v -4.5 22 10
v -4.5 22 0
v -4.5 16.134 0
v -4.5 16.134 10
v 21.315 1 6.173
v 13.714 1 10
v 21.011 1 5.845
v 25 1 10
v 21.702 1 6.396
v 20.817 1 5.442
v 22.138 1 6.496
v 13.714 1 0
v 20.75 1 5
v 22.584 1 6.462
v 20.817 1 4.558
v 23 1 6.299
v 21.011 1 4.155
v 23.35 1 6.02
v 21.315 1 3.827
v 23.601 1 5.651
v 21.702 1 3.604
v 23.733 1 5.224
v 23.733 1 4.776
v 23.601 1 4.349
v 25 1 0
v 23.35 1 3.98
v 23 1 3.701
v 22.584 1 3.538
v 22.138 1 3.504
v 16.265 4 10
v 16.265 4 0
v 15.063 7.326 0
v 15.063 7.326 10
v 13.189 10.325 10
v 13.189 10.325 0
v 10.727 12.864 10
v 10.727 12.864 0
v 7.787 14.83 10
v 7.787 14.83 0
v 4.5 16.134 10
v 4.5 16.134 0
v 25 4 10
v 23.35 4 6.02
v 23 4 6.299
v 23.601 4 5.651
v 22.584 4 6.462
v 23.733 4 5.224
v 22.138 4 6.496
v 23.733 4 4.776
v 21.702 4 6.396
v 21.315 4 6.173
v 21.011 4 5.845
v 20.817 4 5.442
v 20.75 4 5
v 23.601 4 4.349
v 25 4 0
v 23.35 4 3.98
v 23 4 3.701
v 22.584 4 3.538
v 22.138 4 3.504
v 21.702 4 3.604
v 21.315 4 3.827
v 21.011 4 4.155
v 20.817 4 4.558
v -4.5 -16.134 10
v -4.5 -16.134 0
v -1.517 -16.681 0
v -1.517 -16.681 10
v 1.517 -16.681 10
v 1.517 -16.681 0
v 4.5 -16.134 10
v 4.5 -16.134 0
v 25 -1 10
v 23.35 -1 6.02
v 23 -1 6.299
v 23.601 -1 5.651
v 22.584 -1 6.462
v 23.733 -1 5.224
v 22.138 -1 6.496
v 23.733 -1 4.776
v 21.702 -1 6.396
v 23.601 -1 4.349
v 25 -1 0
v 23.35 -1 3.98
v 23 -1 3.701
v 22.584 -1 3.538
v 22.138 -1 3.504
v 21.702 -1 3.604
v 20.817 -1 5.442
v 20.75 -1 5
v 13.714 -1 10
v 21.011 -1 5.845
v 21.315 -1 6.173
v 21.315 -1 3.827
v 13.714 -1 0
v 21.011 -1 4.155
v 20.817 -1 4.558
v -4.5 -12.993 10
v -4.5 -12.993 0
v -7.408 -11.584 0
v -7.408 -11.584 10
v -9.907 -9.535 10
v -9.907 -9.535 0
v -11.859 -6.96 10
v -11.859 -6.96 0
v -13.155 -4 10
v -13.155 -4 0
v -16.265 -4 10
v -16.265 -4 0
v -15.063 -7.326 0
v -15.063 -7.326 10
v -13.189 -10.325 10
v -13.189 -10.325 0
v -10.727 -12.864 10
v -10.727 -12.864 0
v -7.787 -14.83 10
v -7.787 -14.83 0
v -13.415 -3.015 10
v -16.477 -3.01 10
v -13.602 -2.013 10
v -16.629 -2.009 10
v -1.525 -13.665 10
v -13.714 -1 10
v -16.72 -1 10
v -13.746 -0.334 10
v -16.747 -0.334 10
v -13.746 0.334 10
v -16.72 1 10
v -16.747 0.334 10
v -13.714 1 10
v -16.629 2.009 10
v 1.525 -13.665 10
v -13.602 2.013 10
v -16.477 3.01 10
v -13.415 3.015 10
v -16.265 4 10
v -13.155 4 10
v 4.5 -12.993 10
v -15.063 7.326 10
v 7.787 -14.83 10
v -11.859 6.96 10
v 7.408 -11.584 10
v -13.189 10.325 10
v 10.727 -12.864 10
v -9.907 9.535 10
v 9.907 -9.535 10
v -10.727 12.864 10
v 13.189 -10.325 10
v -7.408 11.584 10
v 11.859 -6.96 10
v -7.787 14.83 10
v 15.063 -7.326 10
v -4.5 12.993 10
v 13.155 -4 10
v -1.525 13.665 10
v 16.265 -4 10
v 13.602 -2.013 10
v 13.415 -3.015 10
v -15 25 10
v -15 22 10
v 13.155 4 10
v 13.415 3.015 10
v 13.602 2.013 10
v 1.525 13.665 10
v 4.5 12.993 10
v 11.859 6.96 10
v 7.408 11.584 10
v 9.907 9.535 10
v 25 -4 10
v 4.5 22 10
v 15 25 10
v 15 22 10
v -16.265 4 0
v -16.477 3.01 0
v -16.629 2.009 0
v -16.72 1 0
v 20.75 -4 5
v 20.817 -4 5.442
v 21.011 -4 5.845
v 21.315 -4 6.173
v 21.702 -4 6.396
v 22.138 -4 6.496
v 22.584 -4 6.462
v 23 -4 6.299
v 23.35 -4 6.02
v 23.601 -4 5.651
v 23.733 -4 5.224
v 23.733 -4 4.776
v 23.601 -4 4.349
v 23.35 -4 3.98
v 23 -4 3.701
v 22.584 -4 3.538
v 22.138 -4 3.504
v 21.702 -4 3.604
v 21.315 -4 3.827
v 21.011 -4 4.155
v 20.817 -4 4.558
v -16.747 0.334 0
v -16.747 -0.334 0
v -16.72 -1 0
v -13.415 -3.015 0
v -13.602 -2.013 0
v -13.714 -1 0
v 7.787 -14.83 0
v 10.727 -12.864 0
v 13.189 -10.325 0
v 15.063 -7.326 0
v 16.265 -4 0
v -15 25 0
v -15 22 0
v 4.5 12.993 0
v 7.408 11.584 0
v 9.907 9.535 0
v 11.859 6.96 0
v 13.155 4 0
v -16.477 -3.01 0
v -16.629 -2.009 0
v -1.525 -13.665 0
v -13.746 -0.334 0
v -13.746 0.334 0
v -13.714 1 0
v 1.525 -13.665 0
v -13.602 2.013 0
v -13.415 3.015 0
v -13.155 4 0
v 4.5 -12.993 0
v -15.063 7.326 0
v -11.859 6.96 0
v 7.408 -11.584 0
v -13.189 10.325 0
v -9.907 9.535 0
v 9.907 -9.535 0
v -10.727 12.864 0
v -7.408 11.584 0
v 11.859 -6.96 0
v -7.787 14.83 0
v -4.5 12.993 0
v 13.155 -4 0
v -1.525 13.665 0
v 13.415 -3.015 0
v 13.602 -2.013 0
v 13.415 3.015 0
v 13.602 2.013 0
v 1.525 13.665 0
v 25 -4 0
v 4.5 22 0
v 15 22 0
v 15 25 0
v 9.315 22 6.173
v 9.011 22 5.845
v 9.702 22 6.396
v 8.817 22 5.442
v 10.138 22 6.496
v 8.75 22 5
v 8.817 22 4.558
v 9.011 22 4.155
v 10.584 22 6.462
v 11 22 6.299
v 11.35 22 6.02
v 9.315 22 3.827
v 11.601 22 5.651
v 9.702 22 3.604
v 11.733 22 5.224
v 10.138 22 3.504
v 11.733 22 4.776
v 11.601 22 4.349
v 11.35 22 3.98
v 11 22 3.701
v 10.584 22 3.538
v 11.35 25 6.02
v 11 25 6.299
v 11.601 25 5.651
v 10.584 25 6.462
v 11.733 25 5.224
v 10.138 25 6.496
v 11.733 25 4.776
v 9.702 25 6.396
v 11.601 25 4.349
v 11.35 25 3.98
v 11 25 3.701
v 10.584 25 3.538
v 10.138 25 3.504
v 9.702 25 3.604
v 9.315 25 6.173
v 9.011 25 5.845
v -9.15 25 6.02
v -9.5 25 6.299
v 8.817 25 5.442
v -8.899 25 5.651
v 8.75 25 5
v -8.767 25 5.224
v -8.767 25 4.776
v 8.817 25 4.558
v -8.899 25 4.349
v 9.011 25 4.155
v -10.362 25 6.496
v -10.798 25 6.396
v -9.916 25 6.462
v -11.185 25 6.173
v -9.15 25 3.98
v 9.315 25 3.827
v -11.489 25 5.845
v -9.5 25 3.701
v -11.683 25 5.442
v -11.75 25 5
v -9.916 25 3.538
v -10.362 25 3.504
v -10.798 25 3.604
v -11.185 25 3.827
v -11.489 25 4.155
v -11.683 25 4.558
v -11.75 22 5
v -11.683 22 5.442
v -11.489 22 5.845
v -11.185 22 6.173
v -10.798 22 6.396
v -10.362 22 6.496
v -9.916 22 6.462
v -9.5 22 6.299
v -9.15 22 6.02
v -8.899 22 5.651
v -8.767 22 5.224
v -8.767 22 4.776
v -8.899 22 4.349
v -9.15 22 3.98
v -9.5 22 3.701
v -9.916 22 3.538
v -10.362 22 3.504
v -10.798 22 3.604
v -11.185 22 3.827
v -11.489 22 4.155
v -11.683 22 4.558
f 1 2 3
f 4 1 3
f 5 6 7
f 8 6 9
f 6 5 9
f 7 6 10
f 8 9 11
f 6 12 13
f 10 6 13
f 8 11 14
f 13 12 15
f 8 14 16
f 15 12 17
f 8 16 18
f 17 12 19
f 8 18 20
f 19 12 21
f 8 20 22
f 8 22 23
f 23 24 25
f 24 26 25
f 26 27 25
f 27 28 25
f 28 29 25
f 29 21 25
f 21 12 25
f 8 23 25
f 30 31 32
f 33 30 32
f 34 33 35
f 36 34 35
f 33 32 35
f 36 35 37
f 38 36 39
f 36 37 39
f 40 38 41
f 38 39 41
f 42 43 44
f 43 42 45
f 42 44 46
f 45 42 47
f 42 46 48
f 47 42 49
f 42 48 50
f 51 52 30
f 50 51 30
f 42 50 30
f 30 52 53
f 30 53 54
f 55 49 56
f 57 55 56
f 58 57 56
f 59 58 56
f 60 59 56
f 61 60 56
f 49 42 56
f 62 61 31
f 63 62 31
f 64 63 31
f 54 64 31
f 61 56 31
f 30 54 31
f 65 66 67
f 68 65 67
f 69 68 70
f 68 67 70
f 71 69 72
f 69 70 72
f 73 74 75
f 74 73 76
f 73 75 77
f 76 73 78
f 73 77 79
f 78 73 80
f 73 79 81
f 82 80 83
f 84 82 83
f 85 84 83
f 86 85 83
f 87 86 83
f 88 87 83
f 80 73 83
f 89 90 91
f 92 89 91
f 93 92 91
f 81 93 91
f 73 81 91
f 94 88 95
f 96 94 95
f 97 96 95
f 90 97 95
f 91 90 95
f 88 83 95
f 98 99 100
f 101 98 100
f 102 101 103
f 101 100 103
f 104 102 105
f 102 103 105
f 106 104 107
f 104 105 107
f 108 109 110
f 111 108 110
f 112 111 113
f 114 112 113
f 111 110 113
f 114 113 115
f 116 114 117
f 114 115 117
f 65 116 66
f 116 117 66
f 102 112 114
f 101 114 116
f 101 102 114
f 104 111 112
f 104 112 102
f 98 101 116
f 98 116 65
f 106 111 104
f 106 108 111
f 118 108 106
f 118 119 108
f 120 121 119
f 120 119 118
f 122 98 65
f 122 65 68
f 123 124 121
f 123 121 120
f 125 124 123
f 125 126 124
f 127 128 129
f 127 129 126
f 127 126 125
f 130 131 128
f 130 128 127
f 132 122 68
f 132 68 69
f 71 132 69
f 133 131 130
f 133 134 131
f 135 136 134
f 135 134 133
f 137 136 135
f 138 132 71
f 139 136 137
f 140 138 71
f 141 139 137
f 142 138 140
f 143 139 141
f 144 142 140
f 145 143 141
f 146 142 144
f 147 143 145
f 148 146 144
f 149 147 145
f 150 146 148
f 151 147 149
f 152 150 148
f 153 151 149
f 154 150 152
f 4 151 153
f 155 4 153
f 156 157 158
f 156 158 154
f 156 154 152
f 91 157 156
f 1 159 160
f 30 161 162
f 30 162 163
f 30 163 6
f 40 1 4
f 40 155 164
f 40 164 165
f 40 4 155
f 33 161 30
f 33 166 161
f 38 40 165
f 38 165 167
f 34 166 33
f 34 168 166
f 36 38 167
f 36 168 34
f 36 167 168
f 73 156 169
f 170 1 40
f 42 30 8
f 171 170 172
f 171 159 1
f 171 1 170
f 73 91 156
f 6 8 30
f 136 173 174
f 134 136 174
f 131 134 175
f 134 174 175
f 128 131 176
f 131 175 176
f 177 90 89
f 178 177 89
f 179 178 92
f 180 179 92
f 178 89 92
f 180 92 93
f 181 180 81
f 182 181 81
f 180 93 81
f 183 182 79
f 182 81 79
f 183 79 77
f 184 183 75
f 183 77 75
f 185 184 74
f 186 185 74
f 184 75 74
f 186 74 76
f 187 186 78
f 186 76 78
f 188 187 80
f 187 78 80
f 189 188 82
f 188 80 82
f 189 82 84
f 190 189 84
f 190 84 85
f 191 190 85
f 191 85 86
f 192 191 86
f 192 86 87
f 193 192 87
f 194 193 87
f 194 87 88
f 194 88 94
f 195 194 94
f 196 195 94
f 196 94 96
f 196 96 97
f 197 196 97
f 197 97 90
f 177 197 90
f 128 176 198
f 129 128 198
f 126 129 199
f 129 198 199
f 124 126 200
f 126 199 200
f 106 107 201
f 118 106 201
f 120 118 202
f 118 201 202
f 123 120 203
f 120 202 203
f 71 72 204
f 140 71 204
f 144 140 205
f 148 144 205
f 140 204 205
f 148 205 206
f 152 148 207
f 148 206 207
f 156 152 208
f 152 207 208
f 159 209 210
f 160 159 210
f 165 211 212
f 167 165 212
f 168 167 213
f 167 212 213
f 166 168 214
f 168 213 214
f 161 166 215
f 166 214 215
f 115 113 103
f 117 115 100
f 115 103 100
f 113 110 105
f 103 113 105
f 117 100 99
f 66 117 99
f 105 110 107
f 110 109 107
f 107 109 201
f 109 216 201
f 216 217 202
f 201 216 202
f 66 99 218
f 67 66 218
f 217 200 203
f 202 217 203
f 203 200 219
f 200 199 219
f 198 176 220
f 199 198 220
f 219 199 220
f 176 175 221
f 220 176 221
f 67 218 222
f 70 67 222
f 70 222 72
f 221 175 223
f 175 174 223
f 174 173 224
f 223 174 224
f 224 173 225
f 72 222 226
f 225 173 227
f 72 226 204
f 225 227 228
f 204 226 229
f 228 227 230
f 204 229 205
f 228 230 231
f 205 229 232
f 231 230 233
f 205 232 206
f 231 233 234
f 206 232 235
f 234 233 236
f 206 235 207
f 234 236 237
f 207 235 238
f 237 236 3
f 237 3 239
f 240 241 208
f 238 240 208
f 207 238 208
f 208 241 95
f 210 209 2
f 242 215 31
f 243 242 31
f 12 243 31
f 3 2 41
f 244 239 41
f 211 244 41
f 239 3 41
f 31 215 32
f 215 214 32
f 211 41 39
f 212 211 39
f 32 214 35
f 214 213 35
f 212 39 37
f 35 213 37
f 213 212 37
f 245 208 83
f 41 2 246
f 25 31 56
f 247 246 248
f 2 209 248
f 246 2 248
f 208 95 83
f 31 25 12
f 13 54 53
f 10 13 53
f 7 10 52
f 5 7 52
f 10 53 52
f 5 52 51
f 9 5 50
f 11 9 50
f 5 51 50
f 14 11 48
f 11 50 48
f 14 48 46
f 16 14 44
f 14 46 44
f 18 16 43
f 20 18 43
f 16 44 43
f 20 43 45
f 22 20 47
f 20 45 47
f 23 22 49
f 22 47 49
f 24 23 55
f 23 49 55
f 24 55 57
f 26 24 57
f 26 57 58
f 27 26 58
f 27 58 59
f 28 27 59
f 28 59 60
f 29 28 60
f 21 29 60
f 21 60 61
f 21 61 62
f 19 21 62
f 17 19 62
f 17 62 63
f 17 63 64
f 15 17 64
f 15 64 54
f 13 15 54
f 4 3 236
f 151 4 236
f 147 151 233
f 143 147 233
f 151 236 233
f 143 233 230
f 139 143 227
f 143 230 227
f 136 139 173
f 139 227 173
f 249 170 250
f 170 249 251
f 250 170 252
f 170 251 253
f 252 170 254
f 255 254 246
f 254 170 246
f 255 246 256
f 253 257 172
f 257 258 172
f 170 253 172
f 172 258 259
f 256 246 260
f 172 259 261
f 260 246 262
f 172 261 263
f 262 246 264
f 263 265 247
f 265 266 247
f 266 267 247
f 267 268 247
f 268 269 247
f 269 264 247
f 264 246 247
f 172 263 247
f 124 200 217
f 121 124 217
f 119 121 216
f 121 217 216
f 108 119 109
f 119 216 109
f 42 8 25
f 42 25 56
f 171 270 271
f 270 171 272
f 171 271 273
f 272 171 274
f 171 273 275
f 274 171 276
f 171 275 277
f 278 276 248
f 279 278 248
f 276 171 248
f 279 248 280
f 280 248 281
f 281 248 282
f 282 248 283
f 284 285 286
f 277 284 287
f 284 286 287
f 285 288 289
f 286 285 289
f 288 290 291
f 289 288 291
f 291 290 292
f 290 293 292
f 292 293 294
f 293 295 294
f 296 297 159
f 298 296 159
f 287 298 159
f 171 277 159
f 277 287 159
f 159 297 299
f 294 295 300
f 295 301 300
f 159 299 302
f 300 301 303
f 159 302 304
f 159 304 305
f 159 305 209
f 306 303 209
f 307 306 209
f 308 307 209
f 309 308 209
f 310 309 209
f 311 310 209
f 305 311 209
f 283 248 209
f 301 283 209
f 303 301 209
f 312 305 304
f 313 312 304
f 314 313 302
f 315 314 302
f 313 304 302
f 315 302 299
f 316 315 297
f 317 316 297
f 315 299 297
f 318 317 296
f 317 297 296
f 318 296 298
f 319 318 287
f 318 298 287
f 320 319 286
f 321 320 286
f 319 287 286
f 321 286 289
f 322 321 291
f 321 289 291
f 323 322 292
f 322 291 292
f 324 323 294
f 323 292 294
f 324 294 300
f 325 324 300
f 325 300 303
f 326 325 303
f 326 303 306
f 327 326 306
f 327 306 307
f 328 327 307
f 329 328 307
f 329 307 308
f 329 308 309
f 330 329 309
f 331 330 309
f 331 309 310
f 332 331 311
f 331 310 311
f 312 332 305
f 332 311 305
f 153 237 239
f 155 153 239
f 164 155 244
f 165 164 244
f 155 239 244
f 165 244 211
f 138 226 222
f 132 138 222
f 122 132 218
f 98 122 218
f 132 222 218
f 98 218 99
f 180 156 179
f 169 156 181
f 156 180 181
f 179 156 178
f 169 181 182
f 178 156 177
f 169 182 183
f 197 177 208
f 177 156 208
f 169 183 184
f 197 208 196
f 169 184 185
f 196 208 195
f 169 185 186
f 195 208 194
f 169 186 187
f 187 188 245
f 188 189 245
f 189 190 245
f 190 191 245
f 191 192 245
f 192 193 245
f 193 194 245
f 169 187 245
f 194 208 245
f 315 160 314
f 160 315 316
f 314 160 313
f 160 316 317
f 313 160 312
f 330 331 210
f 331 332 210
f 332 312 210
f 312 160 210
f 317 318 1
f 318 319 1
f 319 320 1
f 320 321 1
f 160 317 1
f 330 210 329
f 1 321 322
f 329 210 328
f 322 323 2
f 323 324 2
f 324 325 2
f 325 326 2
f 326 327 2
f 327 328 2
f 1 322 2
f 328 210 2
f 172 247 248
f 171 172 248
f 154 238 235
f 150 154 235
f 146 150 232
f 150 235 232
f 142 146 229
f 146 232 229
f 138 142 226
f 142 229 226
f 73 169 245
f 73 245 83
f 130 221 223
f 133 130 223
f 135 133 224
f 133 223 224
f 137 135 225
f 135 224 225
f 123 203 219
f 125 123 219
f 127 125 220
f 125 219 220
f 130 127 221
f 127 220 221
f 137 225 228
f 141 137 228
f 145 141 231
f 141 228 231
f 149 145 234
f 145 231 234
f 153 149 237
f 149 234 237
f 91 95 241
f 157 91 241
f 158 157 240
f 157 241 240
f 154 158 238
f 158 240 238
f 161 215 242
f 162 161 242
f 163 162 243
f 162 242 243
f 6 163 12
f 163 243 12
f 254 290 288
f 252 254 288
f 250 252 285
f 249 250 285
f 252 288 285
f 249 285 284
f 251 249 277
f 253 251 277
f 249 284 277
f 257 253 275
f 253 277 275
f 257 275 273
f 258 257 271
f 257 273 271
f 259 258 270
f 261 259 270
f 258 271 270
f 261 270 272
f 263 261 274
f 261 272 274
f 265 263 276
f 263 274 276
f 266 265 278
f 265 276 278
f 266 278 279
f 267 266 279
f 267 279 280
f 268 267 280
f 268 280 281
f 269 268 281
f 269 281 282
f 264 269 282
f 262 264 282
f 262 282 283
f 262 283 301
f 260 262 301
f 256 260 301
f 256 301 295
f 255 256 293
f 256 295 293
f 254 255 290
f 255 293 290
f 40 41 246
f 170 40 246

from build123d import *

# Parameters (mm, degrees)
F0_W     = 9
F0_H     = 1.5
F1_DEPTH = 10
F3_R     = 1.5
F4_DEPTH = 3
F5_DEPTH = 41.751


with BuildPart() as f1:
    # F0 (on Top) → F1 (new body)
    with BuildSketch(Plane.XY):
        Polygon((4.5, 23.5), (4.5, 22), (15, 22), (15, 25), (-15, 25), (-15, 22), (-4.5, 22), (-4.5, 23.5), align=None)
        with Locations((0, 22.75)):
            Rectangle(F0_W, F0_H)
        with BuildLine():
            ThreePointArc((-4.5, 16.1342028003), (0, 16.75), (4.5, 16.1342028003))
            Line((4.5, 16.1342028003), (4.5, 22))
            Line((4.5, 22), (-4.5, 22))
            Line((-4.5, 22), (-4.5, 16.1342028003))
        make_face()
        with BuildLine():
            ThreePointArc((-4.5, 12.9927864602), (0, 13.75), (4.5, 12.9927864602))
            Line((4.5, 12.9927864602), (4.5, 16.1342028003))
            ThreePointArc((4.5, 16.1342028003), (0, 16.75), (-4.5, 16.1342028003))
            Line((-4.5, 16.1342028003), (-4.5, 12.9927864602))
        make_face()
        with BuildLine():
            ThreePointArc((4.5, 12.9927864602), (9.9068234991, 9.5350588964), (13.1553221169, 4))
            Line((13.1553221169, 4), (16.2653773396, 4))
            ThreePointArc((16.2653773396, 4), (12.0253874538, 11.6598694927), (4.5, 16.1342028003))
            Line((4.5, 16.1342028003), (4.5, 12.9927864602))
        make_face()
        with BuildLine():
            ThreePointArc((-13.1553221169, 4), (-9.9068234991, 9.5350588964), (-4.5, 12.9927864602))
            Line((-4.5, 12.9927864602), (-4.5, 16.1342028003))
            ThreePointArc((-4.5, 16.1342028003), (-12.0253874538, 11.6598694927), (-16.2653773396, 4))
            Line((-16.2653773396, 4), (-13.1553221169, 4))
        make_face()
        with BuildLine():
            ThreePointArc((13.1553221169, 4), (13.5179356693, 2.5155347824), (13.7135881519, 1))
            Line((13.7135881519, 1), (16.7201226072, 1))
            ThreePointArc((16.7201226072, 1), (16.5608212866, 2.5103183692), (16.2653773396, 4))
            Line((16.2653773396, 4), (13.1553221169, 4))
        make_face()
        with BuildLine():
            ThreePointArc((16.2653773396, 4), (16.5608212866, 2.5103183692), (16.7201226072, 1))
            Line((16.7201226072, 1), (25, 1))
            Line((25, 1), (25, 4))
            Line((25, 4), (16.2653773396, 4))
        make_face()
        with BuildLine():
            Line((25, -1), (16.7201226072, -1))
            ThreePointArc((16.7201226072, -1), (16.5608212866, -2.5103183692), (16.2653773396, -4))
            Line((16.2653773396, -4), (25, -4))
            Line((25, -4), (25, -1))
        make_face()
        with BuildLine():
            Line((16.7201226072, -1), (13.7135881519, -1))
            ThreePointArc((13.7135881519, -1), (13.5179356693, -2.5155347824), (13.1553221169, -4))
            Line((13.1553221169, -4), (16.2653773396, -4))
            ThreePointArc((16.2653773396, -4), (16.5608212866, -2.5103183692), (16.7201226072, -1))
        make_face()
        with BuildLine():
            Line((16.2653773396, -4), (13.1553221169, -4))
            ThreePointArc((13.1553221169, -4), (9.9068234991, -9.5350588964), (4.5, -12.9927864602))
            Line((4.5, -12.9927864602), (4.5, -16.1342028003))
            ThreePointArc((4.5, -16.1342028003), (12.0253874538, -11.6598694927), (16.2653773396, -4))
        make_face()
        with BuildLine():
            Line((-4.5, -16.1342028003), (-4.5, -12.9927864602))
            ThreePointArc((-4.5, -12.9927864602), (-9.9068234991, -9.5350588964), (-13.1553221169, -4))
            Line((-13.1553221169, -4), (-16.2653773396, -4))
            ThreePointArc((-16.2653773396, -4), (-12.0253874538, -11.6598694927), (-4.5, -16.1342028003))
        make_face()
        with BuildLine():
            ThreePointArc((-13.1553221169, -4), (-13.5179356693, -2.5155347824), (-13.7135881519, -1))
            Line((-13.7135881519, -1), (-16.7201226072, -1))
            ThreePointArc((-16.7201226072, -1), (-16.5608212866, -2.5103183692), (-16.2653773396, -4))
            Line((-16.2653773396, -4), (-13.1553221169, -4))
        make_face()
        with BuildLine():
            ThreePointArc((-13.7135881519, -1), (-13.75, 0), (-13.7135881519, 1))
            Line((-13.7135881519, 1), (-16.7201226072, 1))
            ThreePointArc((-16.7201226072, 1), (-16.75, 0), (-16.7201226072, -1))
            Line((-16.7201226072, -1), (-13.7135881519, -1))
        make_face()
        with BuildLine():
            Line((-16.7201226072, 1), (-13.7135881519, 1))
            ThreePointArc((-13.7135881519, 1), (-13.5179356693, 2.5155347824), (-13.1553221169, 4))
            Line((-13.1553221169, 4), (-16.2653773396, 4))
            ThreePointArc((-16.2653773396, 4), (-16.5608212866, 2.5103183692), (-16.7201226072, 1))
        make_face()
        with BuildLine():
            Line((4.5, -16.1342028003), (4.5, -12.9927864602))
            ThreePointArc((4.5, -12.9927864602), (0, -13.75), (-4.5, -12.9927864602))
            Line((-4.5, -12.9927864602), (-4.5, -16.1342028003))
            ThreePointArc((-4.5, -16.1342028003), (0, -16.75), (4.5, -16.1342028003))
        make_face()
    extrude(amount=F1_DEPTH)

    # F3 (on offset) → F4 (cut, through all)
    with BuildSketch(Plane(origin=(0, 25, 0), x_dir=(-1, 0, 0), z_dir=(0, 1, 0))):
        with Locations((-10.25, 5)):
            Circle(F3_R)
        with Locations((10.25, 5)):
            Circle(F3_R)
        with Locations((-22.25, 5)):
            Circle(F3_R)
    extrude(amount=-F4_DEPTH, mode=Mode.SUBTRACT)

    # F3 (on offset) → F5 (cut, through all)
    with BuildSketch(Plane(origin=(0, 25, 0), x_dir=(-1, 0, 0), z_dir=(0, 1, 0))):
        with Locations((-22.25, 5)):
            Circle(F3_R)
    extrude(amount=-F5_DEPTH, mode=Mode.SUBTRACT)


solid = f1.part
